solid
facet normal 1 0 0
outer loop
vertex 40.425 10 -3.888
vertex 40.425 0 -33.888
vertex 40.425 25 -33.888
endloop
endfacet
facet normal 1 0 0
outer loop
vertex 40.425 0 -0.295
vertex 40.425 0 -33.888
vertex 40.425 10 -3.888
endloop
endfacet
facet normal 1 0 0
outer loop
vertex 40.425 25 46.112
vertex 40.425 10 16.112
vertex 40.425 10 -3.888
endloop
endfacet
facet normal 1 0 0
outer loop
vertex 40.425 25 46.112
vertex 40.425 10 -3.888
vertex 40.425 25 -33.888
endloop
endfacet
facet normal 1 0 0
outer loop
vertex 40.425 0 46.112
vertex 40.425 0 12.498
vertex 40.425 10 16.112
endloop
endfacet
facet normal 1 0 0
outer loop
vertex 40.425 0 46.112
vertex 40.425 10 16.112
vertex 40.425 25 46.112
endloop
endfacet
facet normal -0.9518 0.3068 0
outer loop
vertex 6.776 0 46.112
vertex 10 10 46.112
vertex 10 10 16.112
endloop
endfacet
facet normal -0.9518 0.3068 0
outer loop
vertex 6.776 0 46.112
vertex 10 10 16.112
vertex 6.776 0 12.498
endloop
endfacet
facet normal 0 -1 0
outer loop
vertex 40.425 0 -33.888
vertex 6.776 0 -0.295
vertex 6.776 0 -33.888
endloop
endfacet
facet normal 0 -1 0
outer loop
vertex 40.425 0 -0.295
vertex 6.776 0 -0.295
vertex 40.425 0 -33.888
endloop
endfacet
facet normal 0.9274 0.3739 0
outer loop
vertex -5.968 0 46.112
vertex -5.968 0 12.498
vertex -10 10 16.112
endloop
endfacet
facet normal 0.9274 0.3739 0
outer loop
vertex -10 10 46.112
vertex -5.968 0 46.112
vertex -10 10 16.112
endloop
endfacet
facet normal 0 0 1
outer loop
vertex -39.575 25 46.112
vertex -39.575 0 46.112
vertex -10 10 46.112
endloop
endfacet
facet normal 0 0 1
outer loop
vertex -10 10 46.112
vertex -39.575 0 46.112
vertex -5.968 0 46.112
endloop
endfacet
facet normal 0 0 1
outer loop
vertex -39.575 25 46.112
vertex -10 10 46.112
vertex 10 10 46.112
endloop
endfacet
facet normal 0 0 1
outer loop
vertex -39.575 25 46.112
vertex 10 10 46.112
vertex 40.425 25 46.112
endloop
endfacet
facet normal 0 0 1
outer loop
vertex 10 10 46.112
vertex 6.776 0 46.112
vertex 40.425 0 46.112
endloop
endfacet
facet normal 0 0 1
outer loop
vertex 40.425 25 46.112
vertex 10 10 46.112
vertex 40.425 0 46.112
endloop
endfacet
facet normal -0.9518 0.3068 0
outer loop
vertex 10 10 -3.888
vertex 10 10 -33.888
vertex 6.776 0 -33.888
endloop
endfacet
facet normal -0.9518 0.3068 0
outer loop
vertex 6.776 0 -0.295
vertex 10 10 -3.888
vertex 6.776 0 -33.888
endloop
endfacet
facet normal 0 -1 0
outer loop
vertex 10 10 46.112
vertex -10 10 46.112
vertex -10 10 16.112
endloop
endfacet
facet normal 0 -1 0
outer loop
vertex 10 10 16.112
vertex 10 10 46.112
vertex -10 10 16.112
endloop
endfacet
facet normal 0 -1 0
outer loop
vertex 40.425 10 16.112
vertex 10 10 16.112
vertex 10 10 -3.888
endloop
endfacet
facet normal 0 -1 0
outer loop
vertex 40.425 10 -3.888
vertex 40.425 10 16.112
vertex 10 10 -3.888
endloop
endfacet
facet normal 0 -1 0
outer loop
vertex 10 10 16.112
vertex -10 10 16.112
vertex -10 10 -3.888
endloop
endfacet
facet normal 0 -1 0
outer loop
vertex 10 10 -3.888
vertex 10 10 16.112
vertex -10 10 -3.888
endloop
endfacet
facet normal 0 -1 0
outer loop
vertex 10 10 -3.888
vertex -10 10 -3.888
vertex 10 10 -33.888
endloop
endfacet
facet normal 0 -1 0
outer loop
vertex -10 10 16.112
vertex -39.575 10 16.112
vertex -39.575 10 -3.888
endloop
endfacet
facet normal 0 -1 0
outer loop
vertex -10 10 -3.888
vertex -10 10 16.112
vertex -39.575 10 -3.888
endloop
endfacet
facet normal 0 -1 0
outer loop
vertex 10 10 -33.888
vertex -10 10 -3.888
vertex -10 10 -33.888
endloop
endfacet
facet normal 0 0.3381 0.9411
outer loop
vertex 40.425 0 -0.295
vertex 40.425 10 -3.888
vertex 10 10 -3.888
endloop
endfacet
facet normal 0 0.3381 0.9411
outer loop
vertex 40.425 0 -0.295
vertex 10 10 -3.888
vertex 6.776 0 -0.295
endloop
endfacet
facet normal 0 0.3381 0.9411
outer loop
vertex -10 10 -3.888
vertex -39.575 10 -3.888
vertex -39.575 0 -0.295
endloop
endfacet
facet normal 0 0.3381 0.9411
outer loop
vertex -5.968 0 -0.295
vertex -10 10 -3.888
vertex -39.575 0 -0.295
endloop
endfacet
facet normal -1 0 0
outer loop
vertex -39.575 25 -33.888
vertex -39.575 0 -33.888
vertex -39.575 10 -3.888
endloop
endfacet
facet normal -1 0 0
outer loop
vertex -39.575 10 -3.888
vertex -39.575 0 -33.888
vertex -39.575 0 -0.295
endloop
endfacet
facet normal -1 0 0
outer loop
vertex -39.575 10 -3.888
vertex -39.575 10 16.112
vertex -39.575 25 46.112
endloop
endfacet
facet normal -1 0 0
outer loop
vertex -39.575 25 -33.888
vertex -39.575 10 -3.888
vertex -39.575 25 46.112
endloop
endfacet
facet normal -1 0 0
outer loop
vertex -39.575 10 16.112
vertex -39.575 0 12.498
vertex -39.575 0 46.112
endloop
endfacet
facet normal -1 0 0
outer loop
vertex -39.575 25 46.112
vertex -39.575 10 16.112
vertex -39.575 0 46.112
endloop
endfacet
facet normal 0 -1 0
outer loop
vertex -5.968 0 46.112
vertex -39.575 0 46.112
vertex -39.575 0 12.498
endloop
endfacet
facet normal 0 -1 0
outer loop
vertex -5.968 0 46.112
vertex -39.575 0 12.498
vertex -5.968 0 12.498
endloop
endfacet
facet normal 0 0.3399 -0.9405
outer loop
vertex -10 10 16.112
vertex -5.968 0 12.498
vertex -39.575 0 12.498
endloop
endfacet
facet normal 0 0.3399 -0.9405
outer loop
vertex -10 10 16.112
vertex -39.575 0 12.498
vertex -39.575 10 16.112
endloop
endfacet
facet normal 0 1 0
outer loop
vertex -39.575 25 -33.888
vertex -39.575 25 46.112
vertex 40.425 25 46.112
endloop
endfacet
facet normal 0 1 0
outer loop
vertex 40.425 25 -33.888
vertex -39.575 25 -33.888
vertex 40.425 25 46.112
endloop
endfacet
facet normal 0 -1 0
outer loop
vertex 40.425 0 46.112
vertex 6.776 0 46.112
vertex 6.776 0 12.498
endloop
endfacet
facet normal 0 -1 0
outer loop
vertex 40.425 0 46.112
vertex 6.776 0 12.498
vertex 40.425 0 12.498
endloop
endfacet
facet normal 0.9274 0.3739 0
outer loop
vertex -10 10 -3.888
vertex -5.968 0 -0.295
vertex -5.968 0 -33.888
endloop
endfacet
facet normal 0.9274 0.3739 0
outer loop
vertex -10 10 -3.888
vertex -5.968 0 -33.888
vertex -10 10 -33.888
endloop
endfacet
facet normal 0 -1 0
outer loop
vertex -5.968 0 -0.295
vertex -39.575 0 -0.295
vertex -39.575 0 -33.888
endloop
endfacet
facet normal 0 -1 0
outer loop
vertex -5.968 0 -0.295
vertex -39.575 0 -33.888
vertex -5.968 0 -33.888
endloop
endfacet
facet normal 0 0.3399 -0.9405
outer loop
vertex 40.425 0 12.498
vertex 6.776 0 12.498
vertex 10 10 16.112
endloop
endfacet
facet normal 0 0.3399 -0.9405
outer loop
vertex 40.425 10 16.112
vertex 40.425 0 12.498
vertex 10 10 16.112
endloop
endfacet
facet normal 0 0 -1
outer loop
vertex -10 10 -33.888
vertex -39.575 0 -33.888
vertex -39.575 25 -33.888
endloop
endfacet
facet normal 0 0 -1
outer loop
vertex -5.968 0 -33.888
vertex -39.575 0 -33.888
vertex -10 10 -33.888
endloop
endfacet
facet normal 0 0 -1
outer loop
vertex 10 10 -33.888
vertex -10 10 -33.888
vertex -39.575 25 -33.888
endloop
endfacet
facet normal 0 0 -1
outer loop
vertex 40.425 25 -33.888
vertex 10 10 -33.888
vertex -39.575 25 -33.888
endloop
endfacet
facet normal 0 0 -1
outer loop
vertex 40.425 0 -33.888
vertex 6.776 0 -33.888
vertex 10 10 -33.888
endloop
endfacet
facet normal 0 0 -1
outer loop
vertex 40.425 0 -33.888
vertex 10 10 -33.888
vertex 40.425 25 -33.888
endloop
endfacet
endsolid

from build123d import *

# Parameters (mm, degrees)
F0_W     = 80
F0_H     = 80
F1_DEPTH = 25
F3_DEPTH = 80
F5_DEPTH = 80


with BuildPart() as f1:
    # F0 (on Front) → F1 (new body)
    with BuildSketch(Plane.XZ):
        with Locations((0.42491, 6.112343)):
            Rectangle(F0_W, F0_H)
    extrude(amount=-F1_DEPTH)

    # F2 (on face) → F3 (cut)
    with BuildSketch(Plane(origin=(0, 0, -33.887657), x_dir=(1, 0, 0), z_dir=(0, 0, -1))):
        Polygon((-5.96826, 0), (-10, -10), (10, -10), (6.775631, 0), align=None)
    extrude(amount=-F3_DEPTH, mode=Mode.SUBTRACT)

    # F4 (on face) → F5 (cut)
    with BuildSketch(Plane(origin=(-39.57509, 0, 0), x_dir=(0, -1, 0), z_dir=(-1, 0, 0))):
        Polygon((-10, 16.112343), (-10, 6.112343), (-10, -3.887657), (0, -0.294908), (0, 12.498255), align=None)
    extrude(amount=-F5_DEPTH, mode=Mode.SUBTRACT)


solid = f1.part
